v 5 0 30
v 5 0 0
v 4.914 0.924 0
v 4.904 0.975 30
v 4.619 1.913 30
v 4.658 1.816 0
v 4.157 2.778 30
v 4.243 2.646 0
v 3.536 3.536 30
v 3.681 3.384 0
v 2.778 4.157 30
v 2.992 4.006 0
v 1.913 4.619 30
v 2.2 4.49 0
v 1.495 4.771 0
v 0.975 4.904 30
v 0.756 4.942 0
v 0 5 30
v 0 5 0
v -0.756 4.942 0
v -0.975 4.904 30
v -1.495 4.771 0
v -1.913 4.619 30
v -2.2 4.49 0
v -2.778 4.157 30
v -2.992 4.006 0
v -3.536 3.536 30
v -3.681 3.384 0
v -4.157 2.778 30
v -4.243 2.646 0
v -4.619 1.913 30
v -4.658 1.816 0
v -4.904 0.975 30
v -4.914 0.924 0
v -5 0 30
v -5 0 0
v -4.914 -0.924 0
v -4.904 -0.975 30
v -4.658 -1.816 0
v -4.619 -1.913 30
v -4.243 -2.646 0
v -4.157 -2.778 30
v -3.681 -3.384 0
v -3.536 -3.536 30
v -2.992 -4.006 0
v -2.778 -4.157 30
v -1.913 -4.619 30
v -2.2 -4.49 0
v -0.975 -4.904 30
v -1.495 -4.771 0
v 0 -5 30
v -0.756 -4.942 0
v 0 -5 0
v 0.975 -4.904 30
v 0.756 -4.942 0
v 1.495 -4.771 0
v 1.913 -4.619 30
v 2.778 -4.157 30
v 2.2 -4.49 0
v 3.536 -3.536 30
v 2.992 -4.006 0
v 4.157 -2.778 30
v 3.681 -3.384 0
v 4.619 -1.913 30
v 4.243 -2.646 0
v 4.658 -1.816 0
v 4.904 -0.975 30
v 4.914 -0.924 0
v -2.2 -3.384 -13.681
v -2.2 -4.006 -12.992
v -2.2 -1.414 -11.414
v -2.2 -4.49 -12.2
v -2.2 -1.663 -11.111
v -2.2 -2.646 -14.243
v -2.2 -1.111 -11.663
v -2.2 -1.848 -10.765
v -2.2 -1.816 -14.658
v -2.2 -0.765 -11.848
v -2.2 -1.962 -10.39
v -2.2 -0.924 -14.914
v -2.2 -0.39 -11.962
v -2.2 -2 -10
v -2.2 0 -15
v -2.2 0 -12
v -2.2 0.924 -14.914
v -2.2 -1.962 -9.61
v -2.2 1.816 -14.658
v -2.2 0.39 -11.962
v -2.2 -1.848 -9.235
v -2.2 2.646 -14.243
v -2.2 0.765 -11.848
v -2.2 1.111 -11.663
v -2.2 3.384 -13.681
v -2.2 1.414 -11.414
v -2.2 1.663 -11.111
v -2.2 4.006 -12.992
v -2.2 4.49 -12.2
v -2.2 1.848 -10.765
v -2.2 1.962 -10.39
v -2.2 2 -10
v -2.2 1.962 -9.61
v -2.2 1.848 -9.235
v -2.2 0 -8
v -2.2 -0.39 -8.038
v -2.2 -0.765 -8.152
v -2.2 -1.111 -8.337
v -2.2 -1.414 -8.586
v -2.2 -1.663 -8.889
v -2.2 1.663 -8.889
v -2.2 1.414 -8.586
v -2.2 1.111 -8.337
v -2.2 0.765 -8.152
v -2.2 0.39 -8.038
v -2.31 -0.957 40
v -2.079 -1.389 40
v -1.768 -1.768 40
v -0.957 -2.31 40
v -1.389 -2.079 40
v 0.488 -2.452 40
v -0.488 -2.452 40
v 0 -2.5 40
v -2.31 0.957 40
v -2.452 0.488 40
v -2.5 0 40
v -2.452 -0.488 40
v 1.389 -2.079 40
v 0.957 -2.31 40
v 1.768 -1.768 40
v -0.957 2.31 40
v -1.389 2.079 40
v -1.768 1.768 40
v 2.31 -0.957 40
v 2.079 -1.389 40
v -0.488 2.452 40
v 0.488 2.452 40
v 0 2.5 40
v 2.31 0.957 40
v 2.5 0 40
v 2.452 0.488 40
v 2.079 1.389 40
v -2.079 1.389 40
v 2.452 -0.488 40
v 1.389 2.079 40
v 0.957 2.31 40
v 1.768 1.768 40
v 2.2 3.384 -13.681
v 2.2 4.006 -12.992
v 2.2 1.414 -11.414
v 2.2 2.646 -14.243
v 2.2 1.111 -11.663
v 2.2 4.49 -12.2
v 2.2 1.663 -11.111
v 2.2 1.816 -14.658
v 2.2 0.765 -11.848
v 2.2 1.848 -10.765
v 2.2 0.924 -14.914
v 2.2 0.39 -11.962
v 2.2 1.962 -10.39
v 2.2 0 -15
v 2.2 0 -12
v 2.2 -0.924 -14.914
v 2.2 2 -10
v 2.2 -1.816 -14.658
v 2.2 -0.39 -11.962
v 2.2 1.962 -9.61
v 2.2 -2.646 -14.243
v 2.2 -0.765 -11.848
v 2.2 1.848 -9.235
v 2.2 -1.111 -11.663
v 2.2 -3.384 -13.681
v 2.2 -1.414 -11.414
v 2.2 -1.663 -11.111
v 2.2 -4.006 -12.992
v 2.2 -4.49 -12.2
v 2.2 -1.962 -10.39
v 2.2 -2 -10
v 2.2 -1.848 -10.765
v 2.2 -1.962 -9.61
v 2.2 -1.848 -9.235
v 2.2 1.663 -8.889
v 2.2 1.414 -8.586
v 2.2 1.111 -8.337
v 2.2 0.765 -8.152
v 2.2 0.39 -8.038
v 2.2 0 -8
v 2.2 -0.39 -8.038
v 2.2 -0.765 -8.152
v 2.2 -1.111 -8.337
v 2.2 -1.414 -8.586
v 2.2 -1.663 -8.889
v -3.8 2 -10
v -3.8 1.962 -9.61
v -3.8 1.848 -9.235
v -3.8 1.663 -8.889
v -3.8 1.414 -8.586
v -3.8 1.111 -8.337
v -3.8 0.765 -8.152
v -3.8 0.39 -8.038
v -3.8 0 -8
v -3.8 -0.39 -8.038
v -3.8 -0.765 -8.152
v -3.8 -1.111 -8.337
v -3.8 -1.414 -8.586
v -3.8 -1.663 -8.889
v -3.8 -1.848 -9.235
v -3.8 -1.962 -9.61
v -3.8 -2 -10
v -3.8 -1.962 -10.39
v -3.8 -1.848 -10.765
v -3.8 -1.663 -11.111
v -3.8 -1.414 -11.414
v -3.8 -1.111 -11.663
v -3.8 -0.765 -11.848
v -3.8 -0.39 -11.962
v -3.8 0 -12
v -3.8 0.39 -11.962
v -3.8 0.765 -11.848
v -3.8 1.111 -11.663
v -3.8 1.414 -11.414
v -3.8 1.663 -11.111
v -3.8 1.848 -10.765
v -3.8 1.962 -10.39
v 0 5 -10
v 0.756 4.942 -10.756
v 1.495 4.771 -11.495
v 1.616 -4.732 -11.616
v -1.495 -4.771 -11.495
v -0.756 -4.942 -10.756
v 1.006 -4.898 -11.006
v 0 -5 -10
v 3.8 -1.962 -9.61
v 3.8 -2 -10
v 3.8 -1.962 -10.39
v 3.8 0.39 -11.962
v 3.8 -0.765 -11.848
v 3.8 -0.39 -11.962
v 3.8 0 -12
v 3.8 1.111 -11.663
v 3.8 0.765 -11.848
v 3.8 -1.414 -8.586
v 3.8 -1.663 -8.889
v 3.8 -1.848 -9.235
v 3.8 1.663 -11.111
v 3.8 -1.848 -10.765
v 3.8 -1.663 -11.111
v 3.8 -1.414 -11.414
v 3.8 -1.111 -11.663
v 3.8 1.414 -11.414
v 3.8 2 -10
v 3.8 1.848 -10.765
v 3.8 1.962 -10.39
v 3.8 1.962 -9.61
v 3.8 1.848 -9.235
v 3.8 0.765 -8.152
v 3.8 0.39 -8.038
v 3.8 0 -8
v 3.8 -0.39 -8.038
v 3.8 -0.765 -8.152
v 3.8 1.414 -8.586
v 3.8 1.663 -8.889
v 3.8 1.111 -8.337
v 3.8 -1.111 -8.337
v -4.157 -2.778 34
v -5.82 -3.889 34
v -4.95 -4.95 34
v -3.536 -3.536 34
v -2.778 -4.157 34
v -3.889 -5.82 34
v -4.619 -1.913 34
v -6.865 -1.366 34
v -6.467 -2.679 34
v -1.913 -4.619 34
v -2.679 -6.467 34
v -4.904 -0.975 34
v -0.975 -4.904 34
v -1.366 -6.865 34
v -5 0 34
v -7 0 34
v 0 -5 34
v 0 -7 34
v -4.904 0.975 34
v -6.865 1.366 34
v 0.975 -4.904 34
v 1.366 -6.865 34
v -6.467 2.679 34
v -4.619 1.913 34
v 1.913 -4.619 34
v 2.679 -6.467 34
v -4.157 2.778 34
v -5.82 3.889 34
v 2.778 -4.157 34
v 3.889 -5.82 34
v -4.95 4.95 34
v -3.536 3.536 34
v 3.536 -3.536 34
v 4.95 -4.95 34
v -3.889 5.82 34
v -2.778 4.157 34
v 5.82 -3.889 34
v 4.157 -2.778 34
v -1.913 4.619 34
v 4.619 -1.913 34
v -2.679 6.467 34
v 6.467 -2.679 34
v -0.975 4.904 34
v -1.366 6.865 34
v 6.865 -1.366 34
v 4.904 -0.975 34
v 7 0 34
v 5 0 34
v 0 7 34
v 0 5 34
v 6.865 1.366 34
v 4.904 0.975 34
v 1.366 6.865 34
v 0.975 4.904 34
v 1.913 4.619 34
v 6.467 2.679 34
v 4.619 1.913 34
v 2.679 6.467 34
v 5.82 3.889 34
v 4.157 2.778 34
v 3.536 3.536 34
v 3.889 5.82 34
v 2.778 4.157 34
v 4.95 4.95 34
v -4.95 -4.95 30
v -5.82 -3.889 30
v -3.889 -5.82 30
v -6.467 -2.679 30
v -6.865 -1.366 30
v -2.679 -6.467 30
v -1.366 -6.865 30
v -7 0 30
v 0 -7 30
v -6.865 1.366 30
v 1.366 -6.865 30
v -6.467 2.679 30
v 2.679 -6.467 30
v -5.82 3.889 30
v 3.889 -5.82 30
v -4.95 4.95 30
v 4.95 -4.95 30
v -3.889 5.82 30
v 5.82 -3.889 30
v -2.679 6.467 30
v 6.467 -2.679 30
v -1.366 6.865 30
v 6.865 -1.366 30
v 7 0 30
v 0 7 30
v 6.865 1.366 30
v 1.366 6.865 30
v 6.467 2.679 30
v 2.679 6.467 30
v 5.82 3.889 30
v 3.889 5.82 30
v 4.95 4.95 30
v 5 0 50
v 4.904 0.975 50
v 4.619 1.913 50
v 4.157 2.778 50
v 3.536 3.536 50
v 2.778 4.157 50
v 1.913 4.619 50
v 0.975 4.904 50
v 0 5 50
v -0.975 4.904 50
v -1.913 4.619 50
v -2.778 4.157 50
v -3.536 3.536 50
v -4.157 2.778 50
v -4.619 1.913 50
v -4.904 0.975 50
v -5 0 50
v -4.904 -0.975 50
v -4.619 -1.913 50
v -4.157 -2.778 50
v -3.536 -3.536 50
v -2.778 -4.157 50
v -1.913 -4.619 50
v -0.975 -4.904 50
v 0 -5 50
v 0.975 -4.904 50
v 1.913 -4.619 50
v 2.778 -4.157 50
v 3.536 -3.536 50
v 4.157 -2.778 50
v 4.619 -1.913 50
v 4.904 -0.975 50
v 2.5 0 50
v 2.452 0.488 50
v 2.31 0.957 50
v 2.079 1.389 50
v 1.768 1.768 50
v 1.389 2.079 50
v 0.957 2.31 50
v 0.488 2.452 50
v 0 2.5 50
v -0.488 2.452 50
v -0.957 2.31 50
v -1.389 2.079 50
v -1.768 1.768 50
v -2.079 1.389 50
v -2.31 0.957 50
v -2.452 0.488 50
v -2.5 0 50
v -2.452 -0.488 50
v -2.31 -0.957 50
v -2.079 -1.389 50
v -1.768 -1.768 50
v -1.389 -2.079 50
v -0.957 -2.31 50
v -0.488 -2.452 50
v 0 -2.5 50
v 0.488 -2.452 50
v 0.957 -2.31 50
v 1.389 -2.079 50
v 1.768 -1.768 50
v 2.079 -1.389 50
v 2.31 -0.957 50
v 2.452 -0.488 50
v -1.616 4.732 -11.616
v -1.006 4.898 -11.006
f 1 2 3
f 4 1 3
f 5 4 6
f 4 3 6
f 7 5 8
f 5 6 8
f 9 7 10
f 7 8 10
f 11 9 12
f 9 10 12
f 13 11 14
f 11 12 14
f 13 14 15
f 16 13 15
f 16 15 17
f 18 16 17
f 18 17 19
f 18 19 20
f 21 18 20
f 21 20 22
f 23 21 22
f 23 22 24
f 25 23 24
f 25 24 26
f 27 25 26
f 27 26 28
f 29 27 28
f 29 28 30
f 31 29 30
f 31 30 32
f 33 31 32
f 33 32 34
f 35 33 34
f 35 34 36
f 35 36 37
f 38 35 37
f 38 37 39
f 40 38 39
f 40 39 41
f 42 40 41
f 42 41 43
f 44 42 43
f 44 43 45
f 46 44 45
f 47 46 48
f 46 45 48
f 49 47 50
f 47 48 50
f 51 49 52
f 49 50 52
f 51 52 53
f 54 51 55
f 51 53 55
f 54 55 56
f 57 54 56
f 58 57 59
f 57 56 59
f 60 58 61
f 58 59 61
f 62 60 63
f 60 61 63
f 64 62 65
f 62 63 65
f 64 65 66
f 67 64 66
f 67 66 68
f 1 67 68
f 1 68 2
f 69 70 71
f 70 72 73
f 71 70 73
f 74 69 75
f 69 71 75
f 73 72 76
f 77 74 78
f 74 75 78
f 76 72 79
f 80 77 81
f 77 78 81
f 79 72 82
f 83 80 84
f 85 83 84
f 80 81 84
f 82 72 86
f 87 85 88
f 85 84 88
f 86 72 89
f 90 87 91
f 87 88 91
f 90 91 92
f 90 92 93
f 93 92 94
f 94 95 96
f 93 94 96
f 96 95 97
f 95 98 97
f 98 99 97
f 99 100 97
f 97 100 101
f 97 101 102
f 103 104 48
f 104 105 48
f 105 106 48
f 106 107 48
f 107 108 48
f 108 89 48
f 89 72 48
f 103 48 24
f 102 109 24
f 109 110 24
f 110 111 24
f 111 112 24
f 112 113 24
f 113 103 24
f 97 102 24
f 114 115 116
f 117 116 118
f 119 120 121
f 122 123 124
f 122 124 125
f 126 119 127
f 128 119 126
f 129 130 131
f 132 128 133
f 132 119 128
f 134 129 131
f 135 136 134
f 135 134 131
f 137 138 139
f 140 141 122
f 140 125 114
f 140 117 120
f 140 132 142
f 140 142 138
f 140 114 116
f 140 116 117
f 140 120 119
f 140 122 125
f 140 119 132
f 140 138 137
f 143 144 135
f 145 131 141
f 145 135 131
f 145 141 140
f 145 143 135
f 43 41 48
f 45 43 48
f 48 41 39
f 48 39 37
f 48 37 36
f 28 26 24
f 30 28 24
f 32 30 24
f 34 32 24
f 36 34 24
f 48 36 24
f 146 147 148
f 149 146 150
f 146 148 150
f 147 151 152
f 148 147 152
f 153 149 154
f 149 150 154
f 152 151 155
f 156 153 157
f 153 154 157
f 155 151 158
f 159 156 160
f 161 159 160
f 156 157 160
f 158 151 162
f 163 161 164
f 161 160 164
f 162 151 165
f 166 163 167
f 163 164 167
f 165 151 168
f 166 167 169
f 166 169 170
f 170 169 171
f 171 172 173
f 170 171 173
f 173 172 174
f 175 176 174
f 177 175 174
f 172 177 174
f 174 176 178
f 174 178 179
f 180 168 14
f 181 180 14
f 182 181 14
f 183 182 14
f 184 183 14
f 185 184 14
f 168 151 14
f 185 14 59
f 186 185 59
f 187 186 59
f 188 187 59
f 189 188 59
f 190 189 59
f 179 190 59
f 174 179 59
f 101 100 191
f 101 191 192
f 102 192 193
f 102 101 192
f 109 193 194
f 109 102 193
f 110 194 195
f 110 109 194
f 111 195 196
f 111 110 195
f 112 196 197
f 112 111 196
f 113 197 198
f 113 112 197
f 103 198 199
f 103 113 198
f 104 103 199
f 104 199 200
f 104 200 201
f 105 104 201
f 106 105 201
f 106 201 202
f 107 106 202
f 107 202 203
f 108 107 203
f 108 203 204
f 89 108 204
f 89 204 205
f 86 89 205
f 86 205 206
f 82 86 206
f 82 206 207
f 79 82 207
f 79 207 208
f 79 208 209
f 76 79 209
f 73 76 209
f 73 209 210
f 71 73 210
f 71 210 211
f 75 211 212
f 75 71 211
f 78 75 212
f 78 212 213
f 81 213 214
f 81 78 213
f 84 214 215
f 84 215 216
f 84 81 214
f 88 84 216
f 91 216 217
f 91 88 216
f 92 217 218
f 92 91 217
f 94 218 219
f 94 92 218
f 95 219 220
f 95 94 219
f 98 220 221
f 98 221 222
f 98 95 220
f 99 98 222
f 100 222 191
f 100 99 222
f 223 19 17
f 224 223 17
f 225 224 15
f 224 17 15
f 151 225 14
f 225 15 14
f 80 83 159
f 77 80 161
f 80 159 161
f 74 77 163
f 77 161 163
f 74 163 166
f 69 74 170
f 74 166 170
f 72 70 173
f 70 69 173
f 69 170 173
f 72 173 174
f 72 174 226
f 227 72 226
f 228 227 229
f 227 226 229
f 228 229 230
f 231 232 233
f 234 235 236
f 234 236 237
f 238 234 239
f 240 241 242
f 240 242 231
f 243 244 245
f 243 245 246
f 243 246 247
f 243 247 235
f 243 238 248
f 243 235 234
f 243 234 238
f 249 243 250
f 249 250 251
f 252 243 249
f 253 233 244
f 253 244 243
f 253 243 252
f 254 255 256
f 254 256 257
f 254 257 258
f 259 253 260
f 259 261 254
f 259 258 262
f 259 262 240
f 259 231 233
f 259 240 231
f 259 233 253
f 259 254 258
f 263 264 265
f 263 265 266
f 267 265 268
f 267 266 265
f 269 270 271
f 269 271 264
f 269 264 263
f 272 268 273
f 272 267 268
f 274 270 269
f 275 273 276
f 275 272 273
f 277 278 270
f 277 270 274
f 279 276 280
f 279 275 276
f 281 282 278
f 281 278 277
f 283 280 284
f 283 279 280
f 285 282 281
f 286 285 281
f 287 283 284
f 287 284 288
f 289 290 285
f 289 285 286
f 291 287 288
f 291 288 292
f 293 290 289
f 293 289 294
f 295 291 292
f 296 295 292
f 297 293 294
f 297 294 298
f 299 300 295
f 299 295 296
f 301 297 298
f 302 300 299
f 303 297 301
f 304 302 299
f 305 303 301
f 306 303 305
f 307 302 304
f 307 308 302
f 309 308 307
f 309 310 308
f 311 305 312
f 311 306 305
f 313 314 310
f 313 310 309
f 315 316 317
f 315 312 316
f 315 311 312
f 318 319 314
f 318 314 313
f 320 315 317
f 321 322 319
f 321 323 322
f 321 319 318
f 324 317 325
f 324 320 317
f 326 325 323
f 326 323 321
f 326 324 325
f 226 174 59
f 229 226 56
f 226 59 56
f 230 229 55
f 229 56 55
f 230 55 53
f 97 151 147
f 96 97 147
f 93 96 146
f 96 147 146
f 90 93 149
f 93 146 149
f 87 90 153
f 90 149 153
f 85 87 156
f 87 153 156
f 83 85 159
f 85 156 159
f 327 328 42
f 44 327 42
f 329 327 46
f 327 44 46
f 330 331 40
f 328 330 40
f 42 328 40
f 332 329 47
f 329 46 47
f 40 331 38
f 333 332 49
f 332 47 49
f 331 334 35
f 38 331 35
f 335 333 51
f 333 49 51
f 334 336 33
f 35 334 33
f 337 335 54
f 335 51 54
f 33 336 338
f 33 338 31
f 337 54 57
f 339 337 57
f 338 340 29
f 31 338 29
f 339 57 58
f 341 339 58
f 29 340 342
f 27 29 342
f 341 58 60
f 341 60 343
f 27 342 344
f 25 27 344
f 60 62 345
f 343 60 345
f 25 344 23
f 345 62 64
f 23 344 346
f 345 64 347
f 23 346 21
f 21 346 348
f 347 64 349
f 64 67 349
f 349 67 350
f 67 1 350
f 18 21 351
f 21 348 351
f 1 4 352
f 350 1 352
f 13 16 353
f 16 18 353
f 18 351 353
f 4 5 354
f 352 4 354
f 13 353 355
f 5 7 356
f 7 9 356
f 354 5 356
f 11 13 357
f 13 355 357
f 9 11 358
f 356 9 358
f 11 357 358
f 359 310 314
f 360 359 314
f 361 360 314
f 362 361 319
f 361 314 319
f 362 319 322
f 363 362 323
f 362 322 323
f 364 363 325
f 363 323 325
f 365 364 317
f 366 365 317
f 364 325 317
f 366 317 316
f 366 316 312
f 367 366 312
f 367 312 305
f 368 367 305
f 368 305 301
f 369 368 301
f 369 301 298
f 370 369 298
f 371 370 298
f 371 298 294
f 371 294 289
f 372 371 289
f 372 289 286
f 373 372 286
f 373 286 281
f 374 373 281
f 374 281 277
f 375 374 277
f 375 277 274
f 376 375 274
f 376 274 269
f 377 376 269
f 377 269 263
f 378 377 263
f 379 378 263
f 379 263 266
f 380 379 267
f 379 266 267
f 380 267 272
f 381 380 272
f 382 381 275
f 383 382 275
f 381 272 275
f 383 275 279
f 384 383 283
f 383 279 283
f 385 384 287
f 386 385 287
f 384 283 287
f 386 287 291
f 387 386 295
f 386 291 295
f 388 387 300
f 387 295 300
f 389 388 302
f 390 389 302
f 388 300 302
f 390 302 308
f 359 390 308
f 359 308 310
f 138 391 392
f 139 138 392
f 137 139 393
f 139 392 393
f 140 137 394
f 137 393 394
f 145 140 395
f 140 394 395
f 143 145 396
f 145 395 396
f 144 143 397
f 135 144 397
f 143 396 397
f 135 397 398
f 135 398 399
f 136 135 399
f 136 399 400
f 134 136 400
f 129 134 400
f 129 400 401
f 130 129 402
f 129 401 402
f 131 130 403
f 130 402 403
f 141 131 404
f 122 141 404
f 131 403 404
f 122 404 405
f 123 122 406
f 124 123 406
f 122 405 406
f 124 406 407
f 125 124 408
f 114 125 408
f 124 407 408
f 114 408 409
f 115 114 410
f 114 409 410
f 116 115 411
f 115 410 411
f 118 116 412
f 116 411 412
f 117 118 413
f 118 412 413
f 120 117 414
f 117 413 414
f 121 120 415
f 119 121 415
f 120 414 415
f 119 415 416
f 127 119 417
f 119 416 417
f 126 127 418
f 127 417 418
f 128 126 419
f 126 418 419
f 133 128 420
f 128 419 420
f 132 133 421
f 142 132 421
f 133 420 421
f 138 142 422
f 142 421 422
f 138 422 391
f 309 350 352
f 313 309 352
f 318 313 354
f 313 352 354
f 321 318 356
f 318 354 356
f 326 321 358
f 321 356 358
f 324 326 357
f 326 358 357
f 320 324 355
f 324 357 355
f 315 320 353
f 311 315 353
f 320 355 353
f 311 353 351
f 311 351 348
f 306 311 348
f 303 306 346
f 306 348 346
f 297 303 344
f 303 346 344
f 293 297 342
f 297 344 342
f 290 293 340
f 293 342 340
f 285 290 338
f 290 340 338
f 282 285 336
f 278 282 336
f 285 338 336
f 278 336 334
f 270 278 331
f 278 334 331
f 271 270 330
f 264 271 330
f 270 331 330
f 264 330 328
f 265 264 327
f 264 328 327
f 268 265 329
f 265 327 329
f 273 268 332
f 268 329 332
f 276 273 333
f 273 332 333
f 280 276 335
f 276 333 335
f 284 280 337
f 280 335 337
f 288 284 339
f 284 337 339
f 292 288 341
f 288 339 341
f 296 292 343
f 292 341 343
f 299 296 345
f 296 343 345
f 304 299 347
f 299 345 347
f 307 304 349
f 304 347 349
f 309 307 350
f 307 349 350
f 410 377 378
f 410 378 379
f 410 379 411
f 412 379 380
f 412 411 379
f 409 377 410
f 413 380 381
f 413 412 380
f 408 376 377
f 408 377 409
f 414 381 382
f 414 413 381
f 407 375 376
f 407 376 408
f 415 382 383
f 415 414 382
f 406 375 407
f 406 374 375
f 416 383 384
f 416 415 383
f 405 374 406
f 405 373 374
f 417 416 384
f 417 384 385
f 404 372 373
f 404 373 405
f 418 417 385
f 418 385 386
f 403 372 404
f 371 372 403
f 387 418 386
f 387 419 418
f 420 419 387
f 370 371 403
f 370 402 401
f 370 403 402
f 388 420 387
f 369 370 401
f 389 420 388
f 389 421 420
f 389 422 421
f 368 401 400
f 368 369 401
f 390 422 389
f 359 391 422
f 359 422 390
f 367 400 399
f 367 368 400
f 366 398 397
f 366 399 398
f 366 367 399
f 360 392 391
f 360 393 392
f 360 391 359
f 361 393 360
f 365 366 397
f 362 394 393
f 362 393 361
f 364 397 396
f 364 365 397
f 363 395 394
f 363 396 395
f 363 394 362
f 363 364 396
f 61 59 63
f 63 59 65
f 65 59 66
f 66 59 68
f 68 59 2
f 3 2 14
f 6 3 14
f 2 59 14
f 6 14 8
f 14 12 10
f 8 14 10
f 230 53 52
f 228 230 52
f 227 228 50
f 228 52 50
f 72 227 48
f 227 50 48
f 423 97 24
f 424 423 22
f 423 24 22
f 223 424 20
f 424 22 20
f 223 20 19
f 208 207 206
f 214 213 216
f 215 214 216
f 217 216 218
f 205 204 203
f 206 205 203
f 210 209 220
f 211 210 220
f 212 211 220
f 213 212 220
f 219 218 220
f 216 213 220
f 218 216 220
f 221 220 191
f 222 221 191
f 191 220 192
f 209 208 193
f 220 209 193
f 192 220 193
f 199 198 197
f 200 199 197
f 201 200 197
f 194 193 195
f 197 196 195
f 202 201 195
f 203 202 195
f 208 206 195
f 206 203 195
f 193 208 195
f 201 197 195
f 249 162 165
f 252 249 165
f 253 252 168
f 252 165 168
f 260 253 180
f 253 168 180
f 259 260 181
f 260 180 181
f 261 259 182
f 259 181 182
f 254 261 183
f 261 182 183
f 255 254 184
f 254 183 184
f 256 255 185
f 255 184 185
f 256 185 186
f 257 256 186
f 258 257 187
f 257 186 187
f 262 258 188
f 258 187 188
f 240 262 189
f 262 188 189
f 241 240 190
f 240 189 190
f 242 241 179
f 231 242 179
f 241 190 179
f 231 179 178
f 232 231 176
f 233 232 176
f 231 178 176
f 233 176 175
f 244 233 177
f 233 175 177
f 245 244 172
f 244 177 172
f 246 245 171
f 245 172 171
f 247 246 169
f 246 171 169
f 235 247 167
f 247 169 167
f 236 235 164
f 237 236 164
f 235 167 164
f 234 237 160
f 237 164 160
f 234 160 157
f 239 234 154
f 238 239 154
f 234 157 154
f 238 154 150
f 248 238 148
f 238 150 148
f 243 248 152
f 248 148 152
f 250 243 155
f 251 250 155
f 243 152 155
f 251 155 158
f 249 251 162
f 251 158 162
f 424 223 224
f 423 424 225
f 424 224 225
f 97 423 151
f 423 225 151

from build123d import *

# Parameters (mm, degrees)
F0_R          = 5
F1_DEPTH      = 50
F3_DEPTH      = 15
F5_DEPTH      = 25
F6_R          = 2
F7_DEPTH      = 1.6
F7_DEPTH_BACK = 6
F8_R          = 2.5
F9_DEPTH      = 10
F11_R         = 7
F11_R_2       = 5
F12_DEPTH     = 4


with BuildPart() as f1:
    # F0 (on Top) → F1 (new body)
    with BuildSketch(Plane.XY):
        Circle(F0_R)
    extrude(amount=F1_DEPTH)

    # F2 (on face) → F3 (join)
    with BuildSketch(Plane(origin=(0, 0, 0), x_dir=(1, 0, 0), z_dir=(0, 0, -1))):
        with BuildLine():
            ThreePointArc((2.2, 4.4899888641), (1.1291713066, 4.8708286934), (0, 5))
            ThreePointArc((0, 5), (-1.1291713066, 4.8708286934), (-2.2, 4.4899888641))
            Line((-2.2, 4.4899888641), (-2.2, -4.4899888641))
            ThreePointArc((-2.2, -4.4899888641), (-1.1291713066, -4.8708286934), (0, -5))
            ThreePointArc((0, -5), (1.1291713066, -4.8708286934), (2.2, -4.4899888641))
            Line((2.2, -4.4899888641), (2.2, 4.4899888641))
        make_face()
    extrude(amount=F3_DEPTH)

    # F4 (on face) → F5 (cut)
    with BuildSketch(Plane.YZ.offset(2.2)):
        with BuildLine():
            Line((5, -15), (5, -10))
            ThreePointArc((5, -10), (4.8708286934, -11.1291713066), (4.4899888641, -12.2))
            Line((4.4899888641, -12.2), (4.4899888641, -15))
            Line((4.4899888641, -15), (5, -15))
        make_face()
        with BuildLine():
            Line((4.4899888641, -15), (4.4899888641, -12.2))
            ThreePointArc((4.4899888641, -12.2), (2.6457513111, -14.2426406871), (0, -15))
            Line((0, -15), (4.4899888641, -15))
        make_face()
        with BuildLine():
            Line((-4.4899888641, -15), (0, -15))
            ThreePointArc((0, -15), (-2.6457513111, -14.2426406871), (-4.4899888641, -12.2))
            Line((-4.4899888641, -12.2), (-4.4899888641, -15))
        make_face()
        with BuildLine():
            ThreePointArc((-4.4899888641, -12.2), (-4.8708286934, -11.1291713066), (-5, -10))
            Line((-5, -10), (-5, -15))
            Line((-5, -15), (-4.4899888641, -15))
            Line((-4.4899888641, -15), (-4.4899888641, -12.2))
        make_face()
    extrude(amount=-F5_DEPTH, mode=Mode.SUBTRACT)

    # F6 (on face) → F7 (join, two sides)
    with BuildSketch(Plane.YZ.offset(2.2)) as f7_sk:
        with Locations((0, -10)):
            Circle(F6_R)
    extrude(amount=F7_DEPTH)
    extrude(f7_sk.sketch, amount=-F7_DEPTH_BACK)

    # F8 (on face) → F9 (cut)
    with BuildSketch(Plane.XY.offset(50)):
        Circle(F8_R)
    extrude(amount=-F9_DEPTH, mode=Mode.SUBTRACT)

    # F11 (on offset) → F12 (join)
    with BuildSketch(Plane.XY.offset(30)):
        Circle(F11_R)
        Circle(F11_R_2, mode=Mode.SUBTRACT)
    extrude(amount=F12_DEPTH)


solid = f1.part
